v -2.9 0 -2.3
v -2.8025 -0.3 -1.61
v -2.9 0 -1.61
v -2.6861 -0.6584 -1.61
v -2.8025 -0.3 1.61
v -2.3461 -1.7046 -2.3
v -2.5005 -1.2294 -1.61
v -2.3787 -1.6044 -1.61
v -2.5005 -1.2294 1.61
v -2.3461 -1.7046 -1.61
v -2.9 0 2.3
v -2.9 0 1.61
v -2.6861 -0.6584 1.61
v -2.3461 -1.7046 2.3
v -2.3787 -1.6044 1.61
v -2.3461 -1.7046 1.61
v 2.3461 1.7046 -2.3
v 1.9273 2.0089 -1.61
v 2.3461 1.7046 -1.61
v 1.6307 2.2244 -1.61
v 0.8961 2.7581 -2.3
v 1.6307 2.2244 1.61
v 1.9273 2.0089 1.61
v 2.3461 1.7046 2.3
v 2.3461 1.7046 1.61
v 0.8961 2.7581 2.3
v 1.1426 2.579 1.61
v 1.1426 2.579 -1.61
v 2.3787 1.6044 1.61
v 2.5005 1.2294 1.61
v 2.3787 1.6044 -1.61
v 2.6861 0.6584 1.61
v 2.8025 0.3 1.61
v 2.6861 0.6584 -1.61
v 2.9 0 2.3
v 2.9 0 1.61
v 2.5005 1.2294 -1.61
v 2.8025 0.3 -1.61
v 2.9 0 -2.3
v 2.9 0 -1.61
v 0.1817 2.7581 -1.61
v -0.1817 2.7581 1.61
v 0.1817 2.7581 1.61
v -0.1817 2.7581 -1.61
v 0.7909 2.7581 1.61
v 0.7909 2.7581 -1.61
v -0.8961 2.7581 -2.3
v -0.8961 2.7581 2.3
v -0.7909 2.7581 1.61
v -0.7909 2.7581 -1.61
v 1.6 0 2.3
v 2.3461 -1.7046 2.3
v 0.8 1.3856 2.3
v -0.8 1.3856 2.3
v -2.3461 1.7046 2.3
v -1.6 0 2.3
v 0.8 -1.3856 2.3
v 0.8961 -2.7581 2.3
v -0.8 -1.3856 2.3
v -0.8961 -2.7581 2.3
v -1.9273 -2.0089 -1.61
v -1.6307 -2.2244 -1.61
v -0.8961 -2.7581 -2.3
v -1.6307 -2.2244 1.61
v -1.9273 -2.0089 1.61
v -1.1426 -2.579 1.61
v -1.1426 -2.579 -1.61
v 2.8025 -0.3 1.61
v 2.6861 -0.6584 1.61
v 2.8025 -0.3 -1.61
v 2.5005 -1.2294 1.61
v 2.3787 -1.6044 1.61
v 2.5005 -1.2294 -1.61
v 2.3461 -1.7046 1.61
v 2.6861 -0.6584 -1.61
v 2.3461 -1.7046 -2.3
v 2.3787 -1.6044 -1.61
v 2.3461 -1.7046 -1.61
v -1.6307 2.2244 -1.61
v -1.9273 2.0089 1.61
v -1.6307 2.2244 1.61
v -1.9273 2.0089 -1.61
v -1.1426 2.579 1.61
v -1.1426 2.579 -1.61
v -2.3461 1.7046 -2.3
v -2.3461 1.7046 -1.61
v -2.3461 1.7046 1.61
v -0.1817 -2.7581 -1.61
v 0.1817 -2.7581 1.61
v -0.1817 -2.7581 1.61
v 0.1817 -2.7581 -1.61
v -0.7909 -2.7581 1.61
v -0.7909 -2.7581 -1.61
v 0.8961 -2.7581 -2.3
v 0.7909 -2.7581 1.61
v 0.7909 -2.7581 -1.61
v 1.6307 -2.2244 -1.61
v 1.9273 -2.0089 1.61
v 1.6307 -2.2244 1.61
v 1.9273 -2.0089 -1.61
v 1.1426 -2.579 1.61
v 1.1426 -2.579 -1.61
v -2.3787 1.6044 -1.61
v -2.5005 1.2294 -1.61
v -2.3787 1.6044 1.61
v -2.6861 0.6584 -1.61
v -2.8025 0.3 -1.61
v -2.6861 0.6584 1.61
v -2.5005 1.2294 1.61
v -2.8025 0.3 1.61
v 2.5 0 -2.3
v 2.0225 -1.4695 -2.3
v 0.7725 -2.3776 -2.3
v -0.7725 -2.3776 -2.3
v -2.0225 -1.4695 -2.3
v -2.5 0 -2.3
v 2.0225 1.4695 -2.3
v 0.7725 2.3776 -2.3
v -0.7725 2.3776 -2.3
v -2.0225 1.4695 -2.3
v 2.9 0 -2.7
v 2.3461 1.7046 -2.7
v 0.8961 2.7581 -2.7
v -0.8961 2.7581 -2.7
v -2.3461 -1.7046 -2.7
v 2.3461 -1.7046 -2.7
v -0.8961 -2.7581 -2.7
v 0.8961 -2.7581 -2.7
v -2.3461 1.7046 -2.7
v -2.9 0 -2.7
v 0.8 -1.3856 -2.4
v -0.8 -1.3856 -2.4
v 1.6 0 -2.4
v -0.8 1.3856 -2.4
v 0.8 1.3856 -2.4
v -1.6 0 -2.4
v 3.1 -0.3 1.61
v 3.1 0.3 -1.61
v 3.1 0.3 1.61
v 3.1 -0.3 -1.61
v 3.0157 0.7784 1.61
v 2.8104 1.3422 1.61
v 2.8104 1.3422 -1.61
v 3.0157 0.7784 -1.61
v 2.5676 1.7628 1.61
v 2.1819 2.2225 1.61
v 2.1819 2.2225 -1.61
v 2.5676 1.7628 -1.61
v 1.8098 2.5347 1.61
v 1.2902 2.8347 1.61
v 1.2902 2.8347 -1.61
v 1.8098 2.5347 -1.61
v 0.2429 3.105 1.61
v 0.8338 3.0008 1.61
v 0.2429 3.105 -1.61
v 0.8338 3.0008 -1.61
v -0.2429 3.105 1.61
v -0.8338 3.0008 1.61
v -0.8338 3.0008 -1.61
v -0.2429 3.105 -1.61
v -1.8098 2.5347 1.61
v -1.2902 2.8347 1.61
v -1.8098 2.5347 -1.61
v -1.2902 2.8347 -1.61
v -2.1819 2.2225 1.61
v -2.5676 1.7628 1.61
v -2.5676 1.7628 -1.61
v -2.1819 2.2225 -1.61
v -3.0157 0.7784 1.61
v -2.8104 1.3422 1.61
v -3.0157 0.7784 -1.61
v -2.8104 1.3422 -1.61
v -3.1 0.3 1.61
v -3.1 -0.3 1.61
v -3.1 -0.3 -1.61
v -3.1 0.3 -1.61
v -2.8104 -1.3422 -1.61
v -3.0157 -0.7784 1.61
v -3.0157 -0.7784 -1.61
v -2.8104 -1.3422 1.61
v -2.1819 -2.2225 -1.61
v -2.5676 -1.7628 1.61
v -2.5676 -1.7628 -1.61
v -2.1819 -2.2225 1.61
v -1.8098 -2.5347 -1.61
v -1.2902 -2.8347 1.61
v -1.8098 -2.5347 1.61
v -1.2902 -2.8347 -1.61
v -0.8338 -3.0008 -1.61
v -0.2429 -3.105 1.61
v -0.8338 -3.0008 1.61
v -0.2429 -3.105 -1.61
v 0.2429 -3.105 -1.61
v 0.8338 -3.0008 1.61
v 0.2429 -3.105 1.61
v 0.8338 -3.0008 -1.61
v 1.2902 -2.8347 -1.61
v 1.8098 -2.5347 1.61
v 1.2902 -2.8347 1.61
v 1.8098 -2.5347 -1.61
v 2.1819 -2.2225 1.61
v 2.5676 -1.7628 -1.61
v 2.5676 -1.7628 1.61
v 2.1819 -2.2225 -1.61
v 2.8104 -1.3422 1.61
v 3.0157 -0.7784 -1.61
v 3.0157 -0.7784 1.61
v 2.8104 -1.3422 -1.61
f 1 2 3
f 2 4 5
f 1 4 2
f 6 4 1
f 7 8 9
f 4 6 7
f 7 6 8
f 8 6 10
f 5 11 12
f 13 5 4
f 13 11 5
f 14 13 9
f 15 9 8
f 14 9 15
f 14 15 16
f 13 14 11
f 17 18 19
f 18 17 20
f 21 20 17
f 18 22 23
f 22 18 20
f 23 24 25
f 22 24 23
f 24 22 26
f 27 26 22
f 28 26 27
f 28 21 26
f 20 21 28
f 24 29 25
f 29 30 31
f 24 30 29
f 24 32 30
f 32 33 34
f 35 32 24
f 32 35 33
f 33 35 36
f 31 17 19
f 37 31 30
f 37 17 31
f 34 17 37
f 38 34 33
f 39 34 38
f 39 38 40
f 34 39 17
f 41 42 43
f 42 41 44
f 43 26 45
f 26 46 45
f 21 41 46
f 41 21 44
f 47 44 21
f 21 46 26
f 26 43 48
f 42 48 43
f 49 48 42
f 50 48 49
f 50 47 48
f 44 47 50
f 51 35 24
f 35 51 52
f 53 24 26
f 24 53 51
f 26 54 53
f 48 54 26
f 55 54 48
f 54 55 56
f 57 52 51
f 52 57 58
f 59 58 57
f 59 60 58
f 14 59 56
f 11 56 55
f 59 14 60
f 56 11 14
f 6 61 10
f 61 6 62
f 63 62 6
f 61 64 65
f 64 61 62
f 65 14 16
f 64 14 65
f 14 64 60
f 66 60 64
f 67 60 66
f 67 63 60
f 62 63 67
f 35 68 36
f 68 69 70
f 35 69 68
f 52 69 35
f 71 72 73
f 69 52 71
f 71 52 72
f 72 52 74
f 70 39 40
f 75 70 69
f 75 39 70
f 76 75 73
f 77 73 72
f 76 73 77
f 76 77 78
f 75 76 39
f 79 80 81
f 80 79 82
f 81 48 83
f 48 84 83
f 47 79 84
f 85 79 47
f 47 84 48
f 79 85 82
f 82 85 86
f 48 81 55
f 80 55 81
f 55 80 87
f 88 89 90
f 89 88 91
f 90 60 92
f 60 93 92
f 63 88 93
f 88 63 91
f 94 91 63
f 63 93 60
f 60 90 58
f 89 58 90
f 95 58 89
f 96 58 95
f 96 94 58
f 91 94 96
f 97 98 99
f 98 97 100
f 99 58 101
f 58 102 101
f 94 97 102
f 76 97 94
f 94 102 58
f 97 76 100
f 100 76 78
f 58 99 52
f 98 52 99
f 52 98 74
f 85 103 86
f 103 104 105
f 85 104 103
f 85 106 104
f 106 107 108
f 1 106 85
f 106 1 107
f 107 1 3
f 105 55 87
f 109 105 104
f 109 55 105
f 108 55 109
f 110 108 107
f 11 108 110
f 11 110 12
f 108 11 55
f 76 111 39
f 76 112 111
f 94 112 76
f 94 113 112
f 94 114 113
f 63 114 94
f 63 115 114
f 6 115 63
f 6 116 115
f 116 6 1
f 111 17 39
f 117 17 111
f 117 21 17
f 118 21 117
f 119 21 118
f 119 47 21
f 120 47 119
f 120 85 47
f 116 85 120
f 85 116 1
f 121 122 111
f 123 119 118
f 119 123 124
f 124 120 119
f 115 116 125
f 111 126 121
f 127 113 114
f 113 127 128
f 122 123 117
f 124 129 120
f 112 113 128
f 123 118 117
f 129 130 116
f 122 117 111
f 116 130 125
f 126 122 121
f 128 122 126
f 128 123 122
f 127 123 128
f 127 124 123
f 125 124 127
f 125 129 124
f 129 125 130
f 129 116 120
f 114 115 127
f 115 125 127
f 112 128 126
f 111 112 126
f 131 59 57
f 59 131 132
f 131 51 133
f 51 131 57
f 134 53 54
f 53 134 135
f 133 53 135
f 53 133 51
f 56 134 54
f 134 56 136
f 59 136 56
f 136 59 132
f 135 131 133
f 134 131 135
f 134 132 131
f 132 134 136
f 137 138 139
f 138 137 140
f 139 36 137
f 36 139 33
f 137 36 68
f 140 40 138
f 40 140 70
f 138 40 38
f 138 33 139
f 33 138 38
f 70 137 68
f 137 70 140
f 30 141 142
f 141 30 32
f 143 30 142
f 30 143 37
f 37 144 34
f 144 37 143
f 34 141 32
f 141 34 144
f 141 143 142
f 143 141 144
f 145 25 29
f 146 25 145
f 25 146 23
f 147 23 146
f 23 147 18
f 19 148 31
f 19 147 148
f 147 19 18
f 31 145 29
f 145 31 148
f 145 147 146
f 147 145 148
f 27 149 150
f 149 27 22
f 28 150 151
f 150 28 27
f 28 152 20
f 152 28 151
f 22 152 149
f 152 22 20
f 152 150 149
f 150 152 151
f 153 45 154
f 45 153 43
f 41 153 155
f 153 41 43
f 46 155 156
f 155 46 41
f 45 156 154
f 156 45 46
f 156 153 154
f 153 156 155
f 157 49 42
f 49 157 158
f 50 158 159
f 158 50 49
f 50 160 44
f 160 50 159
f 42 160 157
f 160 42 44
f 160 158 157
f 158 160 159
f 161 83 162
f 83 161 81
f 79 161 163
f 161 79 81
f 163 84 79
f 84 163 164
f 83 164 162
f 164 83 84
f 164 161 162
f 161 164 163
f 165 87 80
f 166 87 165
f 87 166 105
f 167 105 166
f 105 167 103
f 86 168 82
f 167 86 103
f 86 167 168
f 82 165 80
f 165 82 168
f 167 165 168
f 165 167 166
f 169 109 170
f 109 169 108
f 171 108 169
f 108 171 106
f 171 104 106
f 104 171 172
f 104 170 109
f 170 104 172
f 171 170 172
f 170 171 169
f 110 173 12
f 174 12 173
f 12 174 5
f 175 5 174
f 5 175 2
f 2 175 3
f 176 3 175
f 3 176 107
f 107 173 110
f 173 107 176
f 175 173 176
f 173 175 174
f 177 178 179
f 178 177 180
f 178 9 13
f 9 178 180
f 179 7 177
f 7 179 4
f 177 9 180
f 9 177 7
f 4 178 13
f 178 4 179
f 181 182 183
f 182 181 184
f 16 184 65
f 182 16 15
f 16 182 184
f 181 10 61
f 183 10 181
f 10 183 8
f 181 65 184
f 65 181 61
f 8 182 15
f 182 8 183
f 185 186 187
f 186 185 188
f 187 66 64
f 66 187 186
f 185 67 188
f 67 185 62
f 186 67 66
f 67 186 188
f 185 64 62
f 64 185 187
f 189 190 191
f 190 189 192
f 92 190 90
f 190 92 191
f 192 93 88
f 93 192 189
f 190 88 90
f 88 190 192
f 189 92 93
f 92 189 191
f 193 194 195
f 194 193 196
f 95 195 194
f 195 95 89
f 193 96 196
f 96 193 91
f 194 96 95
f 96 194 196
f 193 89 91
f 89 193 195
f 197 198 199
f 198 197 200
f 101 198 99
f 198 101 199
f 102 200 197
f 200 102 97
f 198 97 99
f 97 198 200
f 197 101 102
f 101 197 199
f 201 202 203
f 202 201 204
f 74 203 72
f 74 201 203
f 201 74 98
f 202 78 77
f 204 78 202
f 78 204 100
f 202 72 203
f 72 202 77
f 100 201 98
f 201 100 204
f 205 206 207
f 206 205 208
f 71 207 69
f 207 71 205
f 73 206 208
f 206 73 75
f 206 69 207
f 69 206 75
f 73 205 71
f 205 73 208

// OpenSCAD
// Parameters
insert_outer_diameter = 5.8; //[2.9:11.6:0.1]
insert_length = 4.6; //[2.3:9.2:0.1]
screw_nominal_diameter = 3; //[1.5:6:0.1]
internal_thread_pitch_mm = 0.5; //[0.25:1:0.05]
lead_in_chamfer_depth_mm = 0.4; //[0.2:0.8:0.05]
knurl_depth_mm = 0.2; //[0.1:0.4:0.05]
knurl_pitch_mm = 0.8; //[0.4:1.6:0.05]
tolerance_outer_diameter_mm = 0; //[-0.2:0.2:0.01]
tolerance_length_mm = 0; //[-0.3:0.3:0.01]
internal_thread_clearance_mm = 0.2; //[0.05:0.5:0.05]
bore_extra_depth_mm = 0.2; //[0.1:0.6:0.05]
overlap_mm = 0.8; //[0.5:2:0.1]
knurl_count = 18; //[8:40:1]
ridge_width_mm = 0.6; //[0.3:1.2:0.05]
ridge_height_fraction = 0.7; //[0.3:1:0.05]

// Threaded Insert - complete geometry
module threaded_insert() {
  color([0.8, 0.6, 0.2]) { // Brass color
    difference() {
      // Insert body with chamfer
      union() {
        // Main cylindrical body
        cylinder(
          r=(insert_outer_diameter + tolerance_outer_diameter_mm) / 2,
          h=insert_length + tolerance_length_mm,
          center=true
        );
        // Lead-in chamfer
        translate([0, 0, -(insert_length + tolerance_length_mm) / 2 + lead_in_chamfer_depth_mm / 2 - overlap_mm / 2])
          cylinder(
            r1=(insert_outer_diameter + tolerance_outer_diameter_mm) / 2,
            r2=(insert_outer_diameter + tolerance_outer_diameter_mm) / 2 - lead_in_chamfer_depth_mm,
            h=lead_in_chamfer_depth_mm,
            center=true
          );
      }
      // Internal thread bore
      cylinder(
        r=(screw_nominal_diameter + internal_thread_clearance_mm) / 2,
        h=(insert_length + tolerance_length_mm) + bore_extra_depth_mm,
        center=true
      );
    }
    // Knurling ridges
    union() {
      for (i = [0:knurl_count-1]) {
        rotate([0, 0, i * 360 / knurl_count])
          translate([(insert_outer_diameter + tolerance_outer_diameter_mm) / 2 + (knurl_depth_mm + overlap_mm) / 2 - overlap_mm, 0, 0])
            cube(
              [knurl_depth_mm + overlap_mm, ridge_width_mm, (insert_length + tolerance_length_mm) * ridge_height_fraction],
              center=true
            );
      }
    }
  }
}

// Assembly
module assembly() {
  threaded_insert();
}

assembly();
